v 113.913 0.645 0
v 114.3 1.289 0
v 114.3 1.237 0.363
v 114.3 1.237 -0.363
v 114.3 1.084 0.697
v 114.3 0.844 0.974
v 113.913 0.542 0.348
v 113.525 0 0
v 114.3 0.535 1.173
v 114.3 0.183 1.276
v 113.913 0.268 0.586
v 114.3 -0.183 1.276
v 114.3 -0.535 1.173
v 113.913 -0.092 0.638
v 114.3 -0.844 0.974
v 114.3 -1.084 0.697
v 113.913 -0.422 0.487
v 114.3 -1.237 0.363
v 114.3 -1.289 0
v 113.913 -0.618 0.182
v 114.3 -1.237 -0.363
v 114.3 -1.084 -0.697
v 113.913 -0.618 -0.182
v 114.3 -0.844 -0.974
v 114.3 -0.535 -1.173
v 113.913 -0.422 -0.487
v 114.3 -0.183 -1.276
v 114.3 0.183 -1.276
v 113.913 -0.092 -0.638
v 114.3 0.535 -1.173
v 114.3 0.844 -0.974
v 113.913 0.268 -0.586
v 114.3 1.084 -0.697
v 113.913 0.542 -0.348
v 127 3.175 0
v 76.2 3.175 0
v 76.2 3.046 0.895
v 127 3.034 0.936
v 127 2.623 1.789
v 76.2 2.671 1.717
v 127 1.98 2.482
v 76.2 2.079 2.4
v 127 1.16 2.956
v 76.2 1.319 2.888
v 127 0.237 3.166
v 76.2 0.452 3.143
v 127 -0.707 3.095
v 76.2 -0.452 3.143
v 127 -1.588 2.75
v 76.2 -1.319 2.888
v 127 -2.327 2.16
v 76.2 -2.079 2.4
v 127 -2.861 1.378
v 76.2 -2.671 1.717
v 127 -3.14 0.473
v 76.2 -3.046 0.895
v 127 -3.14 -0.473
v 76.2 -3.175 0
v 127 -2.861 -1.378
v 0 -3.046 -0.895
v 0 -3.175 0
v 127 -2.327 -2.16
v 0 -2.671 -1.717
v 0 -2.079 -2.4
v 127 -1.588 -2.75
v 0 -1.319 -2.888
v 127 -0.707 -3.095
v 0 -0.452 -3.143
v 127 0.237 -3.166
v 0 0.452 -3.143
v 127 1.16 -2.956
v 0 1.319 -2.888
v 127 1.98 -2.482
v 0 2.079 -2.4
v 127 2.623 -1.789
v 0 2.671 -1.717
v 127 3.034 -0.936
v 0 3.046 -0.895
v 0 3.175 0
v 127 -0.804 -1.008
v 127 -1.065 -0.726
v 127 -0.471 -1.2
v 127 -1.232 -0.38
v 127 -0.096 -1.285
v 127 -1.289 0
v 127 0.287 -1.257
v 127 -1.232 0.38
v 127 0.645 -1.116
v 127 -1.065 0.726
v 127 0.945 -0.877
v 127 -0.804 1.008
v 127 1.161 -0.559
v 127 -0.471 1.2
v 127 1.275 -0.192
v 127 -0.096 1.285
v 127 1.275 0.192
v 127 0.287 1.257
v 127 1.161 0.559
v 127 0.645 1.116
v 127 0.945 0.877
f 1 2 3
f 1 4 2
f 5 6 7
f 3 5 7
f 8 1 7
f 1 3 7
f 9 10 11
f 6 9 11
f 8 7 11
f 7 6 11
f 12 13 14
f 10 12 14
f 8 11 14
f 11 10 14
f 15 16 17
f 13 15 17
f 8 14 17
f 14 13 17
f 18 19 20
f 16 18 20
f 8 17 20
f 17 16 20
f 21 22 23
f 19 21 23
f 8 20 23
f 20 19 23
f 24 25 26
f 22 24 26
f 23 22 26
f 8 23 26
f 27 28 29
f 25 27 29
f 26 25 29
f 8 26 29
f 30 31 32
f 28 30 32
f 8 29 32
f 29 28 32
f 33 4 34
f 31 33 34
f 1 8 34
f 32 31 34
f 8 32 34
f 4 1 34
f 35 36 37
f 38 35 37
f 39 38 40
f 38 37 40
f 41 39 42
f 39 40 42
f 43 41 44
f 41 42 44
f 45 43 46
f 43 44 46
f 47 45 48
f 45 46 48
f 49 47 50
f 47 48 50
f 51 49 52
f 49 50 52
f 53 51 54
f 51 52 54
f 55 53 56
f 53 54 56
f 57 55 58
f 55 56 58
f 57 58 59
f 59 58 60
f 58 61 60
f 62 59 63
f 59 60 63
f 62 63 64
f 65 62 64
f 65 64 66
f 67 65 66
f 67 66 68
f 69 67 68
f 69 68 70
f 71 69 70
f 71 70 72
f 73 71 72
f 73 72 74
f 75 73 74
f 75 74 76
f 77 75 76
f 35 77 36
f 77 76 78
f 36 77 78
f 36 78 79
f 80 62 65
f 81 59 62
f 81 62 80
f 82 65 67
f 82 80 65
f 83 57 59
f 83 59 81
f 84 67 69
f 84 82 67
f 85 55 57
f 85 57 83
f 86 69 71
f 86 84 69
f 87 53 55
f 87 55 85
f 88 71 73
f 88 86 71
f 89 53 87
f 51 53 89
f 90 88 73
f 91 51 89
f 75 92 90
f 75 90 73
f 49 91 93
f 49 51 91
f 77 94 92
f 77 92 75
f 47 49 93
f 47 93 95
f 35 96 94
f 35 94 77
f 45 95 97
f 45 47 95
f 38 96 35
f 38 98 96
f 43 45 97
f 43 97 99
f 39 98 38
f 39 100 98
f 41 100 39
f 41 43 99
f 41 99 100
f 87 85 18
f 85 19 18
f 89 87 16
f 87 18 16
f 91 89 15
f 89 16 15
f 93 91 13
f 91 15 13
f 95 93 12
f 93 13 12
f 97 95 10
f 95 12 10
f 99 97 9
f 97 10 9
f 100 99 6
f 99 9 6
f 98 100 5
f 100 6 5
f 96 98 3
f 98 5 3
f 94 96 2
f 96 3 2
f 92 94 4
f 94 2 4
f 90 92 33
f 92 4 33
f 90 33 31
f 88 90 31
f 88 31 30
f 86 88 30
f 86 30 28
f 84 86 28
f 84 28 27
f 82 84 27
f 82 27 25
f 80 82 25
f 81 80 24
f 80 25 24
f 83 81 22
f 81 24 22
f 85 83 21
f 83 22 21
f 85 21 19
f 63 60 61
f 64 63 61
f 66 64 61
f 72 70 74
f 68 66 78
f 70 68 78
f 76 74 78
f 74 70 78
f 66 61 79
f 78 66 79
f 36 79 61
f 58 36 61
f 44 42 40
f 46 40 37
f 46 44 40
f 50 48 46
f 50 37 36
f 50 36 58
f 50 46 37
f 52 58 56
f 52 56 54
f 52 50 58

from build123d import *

# Parameters (mm, degrees)
F0_R     = 3.175
F1_DEPTH = 127
F3_D     = 2.5781
F3_DEPTH = 12.7
F3_TIP   = 0.774539381
F5_DEPTH = 76.2


with BuildPart() as f1:
    # F0 (on Right) → F1 (new body)
    with BuildSketch(Plane.YZ):
        Circle(F0_R)
    extrude(amount=F1_DEPTH)

    # F3
    with Locations(Plane.YZ.offset(127)):
        with Locations((0, 0)):
            Hole(F3_D / 2, depth=F3_DEPTH)
            with Locations((0, 0, -(F3_DEPTH + F3_TIP / 2))):  # 118° drill point
                Cone(0, F3_D / 2, F3_TIP, mode=Mode.SUBTRACT)

    # F4 (on face) → F5 (cut)
    with BuildSketch(Plane(origin=(0, 0, 0), x_dir=(0, -1, 0), z_dir=(-1, 0, 0))):
        with BuildLine():
            ThreePointArc((-0.8255, 0), (0, 0.8255), (0.8255, 0))
            Line((0.8255, 0), (3.175, 0))
            ThreePointArc((3.175, 0), (0, 3.175), (-3.175, 0))
            Line((-3.175, 0), (-0.8255, 0))
        make_face()
        with BuildLine():
            Line((-0.8255, 0), (0.8255, 0))
            ThreePointArc((0.8255, 0), (0, 0.8255), (-0.8255, 0))
        make_face()
    extrude(amount=-F5_DEPTH, mode=Mode.SUBTRACT)


solid = f1.part
